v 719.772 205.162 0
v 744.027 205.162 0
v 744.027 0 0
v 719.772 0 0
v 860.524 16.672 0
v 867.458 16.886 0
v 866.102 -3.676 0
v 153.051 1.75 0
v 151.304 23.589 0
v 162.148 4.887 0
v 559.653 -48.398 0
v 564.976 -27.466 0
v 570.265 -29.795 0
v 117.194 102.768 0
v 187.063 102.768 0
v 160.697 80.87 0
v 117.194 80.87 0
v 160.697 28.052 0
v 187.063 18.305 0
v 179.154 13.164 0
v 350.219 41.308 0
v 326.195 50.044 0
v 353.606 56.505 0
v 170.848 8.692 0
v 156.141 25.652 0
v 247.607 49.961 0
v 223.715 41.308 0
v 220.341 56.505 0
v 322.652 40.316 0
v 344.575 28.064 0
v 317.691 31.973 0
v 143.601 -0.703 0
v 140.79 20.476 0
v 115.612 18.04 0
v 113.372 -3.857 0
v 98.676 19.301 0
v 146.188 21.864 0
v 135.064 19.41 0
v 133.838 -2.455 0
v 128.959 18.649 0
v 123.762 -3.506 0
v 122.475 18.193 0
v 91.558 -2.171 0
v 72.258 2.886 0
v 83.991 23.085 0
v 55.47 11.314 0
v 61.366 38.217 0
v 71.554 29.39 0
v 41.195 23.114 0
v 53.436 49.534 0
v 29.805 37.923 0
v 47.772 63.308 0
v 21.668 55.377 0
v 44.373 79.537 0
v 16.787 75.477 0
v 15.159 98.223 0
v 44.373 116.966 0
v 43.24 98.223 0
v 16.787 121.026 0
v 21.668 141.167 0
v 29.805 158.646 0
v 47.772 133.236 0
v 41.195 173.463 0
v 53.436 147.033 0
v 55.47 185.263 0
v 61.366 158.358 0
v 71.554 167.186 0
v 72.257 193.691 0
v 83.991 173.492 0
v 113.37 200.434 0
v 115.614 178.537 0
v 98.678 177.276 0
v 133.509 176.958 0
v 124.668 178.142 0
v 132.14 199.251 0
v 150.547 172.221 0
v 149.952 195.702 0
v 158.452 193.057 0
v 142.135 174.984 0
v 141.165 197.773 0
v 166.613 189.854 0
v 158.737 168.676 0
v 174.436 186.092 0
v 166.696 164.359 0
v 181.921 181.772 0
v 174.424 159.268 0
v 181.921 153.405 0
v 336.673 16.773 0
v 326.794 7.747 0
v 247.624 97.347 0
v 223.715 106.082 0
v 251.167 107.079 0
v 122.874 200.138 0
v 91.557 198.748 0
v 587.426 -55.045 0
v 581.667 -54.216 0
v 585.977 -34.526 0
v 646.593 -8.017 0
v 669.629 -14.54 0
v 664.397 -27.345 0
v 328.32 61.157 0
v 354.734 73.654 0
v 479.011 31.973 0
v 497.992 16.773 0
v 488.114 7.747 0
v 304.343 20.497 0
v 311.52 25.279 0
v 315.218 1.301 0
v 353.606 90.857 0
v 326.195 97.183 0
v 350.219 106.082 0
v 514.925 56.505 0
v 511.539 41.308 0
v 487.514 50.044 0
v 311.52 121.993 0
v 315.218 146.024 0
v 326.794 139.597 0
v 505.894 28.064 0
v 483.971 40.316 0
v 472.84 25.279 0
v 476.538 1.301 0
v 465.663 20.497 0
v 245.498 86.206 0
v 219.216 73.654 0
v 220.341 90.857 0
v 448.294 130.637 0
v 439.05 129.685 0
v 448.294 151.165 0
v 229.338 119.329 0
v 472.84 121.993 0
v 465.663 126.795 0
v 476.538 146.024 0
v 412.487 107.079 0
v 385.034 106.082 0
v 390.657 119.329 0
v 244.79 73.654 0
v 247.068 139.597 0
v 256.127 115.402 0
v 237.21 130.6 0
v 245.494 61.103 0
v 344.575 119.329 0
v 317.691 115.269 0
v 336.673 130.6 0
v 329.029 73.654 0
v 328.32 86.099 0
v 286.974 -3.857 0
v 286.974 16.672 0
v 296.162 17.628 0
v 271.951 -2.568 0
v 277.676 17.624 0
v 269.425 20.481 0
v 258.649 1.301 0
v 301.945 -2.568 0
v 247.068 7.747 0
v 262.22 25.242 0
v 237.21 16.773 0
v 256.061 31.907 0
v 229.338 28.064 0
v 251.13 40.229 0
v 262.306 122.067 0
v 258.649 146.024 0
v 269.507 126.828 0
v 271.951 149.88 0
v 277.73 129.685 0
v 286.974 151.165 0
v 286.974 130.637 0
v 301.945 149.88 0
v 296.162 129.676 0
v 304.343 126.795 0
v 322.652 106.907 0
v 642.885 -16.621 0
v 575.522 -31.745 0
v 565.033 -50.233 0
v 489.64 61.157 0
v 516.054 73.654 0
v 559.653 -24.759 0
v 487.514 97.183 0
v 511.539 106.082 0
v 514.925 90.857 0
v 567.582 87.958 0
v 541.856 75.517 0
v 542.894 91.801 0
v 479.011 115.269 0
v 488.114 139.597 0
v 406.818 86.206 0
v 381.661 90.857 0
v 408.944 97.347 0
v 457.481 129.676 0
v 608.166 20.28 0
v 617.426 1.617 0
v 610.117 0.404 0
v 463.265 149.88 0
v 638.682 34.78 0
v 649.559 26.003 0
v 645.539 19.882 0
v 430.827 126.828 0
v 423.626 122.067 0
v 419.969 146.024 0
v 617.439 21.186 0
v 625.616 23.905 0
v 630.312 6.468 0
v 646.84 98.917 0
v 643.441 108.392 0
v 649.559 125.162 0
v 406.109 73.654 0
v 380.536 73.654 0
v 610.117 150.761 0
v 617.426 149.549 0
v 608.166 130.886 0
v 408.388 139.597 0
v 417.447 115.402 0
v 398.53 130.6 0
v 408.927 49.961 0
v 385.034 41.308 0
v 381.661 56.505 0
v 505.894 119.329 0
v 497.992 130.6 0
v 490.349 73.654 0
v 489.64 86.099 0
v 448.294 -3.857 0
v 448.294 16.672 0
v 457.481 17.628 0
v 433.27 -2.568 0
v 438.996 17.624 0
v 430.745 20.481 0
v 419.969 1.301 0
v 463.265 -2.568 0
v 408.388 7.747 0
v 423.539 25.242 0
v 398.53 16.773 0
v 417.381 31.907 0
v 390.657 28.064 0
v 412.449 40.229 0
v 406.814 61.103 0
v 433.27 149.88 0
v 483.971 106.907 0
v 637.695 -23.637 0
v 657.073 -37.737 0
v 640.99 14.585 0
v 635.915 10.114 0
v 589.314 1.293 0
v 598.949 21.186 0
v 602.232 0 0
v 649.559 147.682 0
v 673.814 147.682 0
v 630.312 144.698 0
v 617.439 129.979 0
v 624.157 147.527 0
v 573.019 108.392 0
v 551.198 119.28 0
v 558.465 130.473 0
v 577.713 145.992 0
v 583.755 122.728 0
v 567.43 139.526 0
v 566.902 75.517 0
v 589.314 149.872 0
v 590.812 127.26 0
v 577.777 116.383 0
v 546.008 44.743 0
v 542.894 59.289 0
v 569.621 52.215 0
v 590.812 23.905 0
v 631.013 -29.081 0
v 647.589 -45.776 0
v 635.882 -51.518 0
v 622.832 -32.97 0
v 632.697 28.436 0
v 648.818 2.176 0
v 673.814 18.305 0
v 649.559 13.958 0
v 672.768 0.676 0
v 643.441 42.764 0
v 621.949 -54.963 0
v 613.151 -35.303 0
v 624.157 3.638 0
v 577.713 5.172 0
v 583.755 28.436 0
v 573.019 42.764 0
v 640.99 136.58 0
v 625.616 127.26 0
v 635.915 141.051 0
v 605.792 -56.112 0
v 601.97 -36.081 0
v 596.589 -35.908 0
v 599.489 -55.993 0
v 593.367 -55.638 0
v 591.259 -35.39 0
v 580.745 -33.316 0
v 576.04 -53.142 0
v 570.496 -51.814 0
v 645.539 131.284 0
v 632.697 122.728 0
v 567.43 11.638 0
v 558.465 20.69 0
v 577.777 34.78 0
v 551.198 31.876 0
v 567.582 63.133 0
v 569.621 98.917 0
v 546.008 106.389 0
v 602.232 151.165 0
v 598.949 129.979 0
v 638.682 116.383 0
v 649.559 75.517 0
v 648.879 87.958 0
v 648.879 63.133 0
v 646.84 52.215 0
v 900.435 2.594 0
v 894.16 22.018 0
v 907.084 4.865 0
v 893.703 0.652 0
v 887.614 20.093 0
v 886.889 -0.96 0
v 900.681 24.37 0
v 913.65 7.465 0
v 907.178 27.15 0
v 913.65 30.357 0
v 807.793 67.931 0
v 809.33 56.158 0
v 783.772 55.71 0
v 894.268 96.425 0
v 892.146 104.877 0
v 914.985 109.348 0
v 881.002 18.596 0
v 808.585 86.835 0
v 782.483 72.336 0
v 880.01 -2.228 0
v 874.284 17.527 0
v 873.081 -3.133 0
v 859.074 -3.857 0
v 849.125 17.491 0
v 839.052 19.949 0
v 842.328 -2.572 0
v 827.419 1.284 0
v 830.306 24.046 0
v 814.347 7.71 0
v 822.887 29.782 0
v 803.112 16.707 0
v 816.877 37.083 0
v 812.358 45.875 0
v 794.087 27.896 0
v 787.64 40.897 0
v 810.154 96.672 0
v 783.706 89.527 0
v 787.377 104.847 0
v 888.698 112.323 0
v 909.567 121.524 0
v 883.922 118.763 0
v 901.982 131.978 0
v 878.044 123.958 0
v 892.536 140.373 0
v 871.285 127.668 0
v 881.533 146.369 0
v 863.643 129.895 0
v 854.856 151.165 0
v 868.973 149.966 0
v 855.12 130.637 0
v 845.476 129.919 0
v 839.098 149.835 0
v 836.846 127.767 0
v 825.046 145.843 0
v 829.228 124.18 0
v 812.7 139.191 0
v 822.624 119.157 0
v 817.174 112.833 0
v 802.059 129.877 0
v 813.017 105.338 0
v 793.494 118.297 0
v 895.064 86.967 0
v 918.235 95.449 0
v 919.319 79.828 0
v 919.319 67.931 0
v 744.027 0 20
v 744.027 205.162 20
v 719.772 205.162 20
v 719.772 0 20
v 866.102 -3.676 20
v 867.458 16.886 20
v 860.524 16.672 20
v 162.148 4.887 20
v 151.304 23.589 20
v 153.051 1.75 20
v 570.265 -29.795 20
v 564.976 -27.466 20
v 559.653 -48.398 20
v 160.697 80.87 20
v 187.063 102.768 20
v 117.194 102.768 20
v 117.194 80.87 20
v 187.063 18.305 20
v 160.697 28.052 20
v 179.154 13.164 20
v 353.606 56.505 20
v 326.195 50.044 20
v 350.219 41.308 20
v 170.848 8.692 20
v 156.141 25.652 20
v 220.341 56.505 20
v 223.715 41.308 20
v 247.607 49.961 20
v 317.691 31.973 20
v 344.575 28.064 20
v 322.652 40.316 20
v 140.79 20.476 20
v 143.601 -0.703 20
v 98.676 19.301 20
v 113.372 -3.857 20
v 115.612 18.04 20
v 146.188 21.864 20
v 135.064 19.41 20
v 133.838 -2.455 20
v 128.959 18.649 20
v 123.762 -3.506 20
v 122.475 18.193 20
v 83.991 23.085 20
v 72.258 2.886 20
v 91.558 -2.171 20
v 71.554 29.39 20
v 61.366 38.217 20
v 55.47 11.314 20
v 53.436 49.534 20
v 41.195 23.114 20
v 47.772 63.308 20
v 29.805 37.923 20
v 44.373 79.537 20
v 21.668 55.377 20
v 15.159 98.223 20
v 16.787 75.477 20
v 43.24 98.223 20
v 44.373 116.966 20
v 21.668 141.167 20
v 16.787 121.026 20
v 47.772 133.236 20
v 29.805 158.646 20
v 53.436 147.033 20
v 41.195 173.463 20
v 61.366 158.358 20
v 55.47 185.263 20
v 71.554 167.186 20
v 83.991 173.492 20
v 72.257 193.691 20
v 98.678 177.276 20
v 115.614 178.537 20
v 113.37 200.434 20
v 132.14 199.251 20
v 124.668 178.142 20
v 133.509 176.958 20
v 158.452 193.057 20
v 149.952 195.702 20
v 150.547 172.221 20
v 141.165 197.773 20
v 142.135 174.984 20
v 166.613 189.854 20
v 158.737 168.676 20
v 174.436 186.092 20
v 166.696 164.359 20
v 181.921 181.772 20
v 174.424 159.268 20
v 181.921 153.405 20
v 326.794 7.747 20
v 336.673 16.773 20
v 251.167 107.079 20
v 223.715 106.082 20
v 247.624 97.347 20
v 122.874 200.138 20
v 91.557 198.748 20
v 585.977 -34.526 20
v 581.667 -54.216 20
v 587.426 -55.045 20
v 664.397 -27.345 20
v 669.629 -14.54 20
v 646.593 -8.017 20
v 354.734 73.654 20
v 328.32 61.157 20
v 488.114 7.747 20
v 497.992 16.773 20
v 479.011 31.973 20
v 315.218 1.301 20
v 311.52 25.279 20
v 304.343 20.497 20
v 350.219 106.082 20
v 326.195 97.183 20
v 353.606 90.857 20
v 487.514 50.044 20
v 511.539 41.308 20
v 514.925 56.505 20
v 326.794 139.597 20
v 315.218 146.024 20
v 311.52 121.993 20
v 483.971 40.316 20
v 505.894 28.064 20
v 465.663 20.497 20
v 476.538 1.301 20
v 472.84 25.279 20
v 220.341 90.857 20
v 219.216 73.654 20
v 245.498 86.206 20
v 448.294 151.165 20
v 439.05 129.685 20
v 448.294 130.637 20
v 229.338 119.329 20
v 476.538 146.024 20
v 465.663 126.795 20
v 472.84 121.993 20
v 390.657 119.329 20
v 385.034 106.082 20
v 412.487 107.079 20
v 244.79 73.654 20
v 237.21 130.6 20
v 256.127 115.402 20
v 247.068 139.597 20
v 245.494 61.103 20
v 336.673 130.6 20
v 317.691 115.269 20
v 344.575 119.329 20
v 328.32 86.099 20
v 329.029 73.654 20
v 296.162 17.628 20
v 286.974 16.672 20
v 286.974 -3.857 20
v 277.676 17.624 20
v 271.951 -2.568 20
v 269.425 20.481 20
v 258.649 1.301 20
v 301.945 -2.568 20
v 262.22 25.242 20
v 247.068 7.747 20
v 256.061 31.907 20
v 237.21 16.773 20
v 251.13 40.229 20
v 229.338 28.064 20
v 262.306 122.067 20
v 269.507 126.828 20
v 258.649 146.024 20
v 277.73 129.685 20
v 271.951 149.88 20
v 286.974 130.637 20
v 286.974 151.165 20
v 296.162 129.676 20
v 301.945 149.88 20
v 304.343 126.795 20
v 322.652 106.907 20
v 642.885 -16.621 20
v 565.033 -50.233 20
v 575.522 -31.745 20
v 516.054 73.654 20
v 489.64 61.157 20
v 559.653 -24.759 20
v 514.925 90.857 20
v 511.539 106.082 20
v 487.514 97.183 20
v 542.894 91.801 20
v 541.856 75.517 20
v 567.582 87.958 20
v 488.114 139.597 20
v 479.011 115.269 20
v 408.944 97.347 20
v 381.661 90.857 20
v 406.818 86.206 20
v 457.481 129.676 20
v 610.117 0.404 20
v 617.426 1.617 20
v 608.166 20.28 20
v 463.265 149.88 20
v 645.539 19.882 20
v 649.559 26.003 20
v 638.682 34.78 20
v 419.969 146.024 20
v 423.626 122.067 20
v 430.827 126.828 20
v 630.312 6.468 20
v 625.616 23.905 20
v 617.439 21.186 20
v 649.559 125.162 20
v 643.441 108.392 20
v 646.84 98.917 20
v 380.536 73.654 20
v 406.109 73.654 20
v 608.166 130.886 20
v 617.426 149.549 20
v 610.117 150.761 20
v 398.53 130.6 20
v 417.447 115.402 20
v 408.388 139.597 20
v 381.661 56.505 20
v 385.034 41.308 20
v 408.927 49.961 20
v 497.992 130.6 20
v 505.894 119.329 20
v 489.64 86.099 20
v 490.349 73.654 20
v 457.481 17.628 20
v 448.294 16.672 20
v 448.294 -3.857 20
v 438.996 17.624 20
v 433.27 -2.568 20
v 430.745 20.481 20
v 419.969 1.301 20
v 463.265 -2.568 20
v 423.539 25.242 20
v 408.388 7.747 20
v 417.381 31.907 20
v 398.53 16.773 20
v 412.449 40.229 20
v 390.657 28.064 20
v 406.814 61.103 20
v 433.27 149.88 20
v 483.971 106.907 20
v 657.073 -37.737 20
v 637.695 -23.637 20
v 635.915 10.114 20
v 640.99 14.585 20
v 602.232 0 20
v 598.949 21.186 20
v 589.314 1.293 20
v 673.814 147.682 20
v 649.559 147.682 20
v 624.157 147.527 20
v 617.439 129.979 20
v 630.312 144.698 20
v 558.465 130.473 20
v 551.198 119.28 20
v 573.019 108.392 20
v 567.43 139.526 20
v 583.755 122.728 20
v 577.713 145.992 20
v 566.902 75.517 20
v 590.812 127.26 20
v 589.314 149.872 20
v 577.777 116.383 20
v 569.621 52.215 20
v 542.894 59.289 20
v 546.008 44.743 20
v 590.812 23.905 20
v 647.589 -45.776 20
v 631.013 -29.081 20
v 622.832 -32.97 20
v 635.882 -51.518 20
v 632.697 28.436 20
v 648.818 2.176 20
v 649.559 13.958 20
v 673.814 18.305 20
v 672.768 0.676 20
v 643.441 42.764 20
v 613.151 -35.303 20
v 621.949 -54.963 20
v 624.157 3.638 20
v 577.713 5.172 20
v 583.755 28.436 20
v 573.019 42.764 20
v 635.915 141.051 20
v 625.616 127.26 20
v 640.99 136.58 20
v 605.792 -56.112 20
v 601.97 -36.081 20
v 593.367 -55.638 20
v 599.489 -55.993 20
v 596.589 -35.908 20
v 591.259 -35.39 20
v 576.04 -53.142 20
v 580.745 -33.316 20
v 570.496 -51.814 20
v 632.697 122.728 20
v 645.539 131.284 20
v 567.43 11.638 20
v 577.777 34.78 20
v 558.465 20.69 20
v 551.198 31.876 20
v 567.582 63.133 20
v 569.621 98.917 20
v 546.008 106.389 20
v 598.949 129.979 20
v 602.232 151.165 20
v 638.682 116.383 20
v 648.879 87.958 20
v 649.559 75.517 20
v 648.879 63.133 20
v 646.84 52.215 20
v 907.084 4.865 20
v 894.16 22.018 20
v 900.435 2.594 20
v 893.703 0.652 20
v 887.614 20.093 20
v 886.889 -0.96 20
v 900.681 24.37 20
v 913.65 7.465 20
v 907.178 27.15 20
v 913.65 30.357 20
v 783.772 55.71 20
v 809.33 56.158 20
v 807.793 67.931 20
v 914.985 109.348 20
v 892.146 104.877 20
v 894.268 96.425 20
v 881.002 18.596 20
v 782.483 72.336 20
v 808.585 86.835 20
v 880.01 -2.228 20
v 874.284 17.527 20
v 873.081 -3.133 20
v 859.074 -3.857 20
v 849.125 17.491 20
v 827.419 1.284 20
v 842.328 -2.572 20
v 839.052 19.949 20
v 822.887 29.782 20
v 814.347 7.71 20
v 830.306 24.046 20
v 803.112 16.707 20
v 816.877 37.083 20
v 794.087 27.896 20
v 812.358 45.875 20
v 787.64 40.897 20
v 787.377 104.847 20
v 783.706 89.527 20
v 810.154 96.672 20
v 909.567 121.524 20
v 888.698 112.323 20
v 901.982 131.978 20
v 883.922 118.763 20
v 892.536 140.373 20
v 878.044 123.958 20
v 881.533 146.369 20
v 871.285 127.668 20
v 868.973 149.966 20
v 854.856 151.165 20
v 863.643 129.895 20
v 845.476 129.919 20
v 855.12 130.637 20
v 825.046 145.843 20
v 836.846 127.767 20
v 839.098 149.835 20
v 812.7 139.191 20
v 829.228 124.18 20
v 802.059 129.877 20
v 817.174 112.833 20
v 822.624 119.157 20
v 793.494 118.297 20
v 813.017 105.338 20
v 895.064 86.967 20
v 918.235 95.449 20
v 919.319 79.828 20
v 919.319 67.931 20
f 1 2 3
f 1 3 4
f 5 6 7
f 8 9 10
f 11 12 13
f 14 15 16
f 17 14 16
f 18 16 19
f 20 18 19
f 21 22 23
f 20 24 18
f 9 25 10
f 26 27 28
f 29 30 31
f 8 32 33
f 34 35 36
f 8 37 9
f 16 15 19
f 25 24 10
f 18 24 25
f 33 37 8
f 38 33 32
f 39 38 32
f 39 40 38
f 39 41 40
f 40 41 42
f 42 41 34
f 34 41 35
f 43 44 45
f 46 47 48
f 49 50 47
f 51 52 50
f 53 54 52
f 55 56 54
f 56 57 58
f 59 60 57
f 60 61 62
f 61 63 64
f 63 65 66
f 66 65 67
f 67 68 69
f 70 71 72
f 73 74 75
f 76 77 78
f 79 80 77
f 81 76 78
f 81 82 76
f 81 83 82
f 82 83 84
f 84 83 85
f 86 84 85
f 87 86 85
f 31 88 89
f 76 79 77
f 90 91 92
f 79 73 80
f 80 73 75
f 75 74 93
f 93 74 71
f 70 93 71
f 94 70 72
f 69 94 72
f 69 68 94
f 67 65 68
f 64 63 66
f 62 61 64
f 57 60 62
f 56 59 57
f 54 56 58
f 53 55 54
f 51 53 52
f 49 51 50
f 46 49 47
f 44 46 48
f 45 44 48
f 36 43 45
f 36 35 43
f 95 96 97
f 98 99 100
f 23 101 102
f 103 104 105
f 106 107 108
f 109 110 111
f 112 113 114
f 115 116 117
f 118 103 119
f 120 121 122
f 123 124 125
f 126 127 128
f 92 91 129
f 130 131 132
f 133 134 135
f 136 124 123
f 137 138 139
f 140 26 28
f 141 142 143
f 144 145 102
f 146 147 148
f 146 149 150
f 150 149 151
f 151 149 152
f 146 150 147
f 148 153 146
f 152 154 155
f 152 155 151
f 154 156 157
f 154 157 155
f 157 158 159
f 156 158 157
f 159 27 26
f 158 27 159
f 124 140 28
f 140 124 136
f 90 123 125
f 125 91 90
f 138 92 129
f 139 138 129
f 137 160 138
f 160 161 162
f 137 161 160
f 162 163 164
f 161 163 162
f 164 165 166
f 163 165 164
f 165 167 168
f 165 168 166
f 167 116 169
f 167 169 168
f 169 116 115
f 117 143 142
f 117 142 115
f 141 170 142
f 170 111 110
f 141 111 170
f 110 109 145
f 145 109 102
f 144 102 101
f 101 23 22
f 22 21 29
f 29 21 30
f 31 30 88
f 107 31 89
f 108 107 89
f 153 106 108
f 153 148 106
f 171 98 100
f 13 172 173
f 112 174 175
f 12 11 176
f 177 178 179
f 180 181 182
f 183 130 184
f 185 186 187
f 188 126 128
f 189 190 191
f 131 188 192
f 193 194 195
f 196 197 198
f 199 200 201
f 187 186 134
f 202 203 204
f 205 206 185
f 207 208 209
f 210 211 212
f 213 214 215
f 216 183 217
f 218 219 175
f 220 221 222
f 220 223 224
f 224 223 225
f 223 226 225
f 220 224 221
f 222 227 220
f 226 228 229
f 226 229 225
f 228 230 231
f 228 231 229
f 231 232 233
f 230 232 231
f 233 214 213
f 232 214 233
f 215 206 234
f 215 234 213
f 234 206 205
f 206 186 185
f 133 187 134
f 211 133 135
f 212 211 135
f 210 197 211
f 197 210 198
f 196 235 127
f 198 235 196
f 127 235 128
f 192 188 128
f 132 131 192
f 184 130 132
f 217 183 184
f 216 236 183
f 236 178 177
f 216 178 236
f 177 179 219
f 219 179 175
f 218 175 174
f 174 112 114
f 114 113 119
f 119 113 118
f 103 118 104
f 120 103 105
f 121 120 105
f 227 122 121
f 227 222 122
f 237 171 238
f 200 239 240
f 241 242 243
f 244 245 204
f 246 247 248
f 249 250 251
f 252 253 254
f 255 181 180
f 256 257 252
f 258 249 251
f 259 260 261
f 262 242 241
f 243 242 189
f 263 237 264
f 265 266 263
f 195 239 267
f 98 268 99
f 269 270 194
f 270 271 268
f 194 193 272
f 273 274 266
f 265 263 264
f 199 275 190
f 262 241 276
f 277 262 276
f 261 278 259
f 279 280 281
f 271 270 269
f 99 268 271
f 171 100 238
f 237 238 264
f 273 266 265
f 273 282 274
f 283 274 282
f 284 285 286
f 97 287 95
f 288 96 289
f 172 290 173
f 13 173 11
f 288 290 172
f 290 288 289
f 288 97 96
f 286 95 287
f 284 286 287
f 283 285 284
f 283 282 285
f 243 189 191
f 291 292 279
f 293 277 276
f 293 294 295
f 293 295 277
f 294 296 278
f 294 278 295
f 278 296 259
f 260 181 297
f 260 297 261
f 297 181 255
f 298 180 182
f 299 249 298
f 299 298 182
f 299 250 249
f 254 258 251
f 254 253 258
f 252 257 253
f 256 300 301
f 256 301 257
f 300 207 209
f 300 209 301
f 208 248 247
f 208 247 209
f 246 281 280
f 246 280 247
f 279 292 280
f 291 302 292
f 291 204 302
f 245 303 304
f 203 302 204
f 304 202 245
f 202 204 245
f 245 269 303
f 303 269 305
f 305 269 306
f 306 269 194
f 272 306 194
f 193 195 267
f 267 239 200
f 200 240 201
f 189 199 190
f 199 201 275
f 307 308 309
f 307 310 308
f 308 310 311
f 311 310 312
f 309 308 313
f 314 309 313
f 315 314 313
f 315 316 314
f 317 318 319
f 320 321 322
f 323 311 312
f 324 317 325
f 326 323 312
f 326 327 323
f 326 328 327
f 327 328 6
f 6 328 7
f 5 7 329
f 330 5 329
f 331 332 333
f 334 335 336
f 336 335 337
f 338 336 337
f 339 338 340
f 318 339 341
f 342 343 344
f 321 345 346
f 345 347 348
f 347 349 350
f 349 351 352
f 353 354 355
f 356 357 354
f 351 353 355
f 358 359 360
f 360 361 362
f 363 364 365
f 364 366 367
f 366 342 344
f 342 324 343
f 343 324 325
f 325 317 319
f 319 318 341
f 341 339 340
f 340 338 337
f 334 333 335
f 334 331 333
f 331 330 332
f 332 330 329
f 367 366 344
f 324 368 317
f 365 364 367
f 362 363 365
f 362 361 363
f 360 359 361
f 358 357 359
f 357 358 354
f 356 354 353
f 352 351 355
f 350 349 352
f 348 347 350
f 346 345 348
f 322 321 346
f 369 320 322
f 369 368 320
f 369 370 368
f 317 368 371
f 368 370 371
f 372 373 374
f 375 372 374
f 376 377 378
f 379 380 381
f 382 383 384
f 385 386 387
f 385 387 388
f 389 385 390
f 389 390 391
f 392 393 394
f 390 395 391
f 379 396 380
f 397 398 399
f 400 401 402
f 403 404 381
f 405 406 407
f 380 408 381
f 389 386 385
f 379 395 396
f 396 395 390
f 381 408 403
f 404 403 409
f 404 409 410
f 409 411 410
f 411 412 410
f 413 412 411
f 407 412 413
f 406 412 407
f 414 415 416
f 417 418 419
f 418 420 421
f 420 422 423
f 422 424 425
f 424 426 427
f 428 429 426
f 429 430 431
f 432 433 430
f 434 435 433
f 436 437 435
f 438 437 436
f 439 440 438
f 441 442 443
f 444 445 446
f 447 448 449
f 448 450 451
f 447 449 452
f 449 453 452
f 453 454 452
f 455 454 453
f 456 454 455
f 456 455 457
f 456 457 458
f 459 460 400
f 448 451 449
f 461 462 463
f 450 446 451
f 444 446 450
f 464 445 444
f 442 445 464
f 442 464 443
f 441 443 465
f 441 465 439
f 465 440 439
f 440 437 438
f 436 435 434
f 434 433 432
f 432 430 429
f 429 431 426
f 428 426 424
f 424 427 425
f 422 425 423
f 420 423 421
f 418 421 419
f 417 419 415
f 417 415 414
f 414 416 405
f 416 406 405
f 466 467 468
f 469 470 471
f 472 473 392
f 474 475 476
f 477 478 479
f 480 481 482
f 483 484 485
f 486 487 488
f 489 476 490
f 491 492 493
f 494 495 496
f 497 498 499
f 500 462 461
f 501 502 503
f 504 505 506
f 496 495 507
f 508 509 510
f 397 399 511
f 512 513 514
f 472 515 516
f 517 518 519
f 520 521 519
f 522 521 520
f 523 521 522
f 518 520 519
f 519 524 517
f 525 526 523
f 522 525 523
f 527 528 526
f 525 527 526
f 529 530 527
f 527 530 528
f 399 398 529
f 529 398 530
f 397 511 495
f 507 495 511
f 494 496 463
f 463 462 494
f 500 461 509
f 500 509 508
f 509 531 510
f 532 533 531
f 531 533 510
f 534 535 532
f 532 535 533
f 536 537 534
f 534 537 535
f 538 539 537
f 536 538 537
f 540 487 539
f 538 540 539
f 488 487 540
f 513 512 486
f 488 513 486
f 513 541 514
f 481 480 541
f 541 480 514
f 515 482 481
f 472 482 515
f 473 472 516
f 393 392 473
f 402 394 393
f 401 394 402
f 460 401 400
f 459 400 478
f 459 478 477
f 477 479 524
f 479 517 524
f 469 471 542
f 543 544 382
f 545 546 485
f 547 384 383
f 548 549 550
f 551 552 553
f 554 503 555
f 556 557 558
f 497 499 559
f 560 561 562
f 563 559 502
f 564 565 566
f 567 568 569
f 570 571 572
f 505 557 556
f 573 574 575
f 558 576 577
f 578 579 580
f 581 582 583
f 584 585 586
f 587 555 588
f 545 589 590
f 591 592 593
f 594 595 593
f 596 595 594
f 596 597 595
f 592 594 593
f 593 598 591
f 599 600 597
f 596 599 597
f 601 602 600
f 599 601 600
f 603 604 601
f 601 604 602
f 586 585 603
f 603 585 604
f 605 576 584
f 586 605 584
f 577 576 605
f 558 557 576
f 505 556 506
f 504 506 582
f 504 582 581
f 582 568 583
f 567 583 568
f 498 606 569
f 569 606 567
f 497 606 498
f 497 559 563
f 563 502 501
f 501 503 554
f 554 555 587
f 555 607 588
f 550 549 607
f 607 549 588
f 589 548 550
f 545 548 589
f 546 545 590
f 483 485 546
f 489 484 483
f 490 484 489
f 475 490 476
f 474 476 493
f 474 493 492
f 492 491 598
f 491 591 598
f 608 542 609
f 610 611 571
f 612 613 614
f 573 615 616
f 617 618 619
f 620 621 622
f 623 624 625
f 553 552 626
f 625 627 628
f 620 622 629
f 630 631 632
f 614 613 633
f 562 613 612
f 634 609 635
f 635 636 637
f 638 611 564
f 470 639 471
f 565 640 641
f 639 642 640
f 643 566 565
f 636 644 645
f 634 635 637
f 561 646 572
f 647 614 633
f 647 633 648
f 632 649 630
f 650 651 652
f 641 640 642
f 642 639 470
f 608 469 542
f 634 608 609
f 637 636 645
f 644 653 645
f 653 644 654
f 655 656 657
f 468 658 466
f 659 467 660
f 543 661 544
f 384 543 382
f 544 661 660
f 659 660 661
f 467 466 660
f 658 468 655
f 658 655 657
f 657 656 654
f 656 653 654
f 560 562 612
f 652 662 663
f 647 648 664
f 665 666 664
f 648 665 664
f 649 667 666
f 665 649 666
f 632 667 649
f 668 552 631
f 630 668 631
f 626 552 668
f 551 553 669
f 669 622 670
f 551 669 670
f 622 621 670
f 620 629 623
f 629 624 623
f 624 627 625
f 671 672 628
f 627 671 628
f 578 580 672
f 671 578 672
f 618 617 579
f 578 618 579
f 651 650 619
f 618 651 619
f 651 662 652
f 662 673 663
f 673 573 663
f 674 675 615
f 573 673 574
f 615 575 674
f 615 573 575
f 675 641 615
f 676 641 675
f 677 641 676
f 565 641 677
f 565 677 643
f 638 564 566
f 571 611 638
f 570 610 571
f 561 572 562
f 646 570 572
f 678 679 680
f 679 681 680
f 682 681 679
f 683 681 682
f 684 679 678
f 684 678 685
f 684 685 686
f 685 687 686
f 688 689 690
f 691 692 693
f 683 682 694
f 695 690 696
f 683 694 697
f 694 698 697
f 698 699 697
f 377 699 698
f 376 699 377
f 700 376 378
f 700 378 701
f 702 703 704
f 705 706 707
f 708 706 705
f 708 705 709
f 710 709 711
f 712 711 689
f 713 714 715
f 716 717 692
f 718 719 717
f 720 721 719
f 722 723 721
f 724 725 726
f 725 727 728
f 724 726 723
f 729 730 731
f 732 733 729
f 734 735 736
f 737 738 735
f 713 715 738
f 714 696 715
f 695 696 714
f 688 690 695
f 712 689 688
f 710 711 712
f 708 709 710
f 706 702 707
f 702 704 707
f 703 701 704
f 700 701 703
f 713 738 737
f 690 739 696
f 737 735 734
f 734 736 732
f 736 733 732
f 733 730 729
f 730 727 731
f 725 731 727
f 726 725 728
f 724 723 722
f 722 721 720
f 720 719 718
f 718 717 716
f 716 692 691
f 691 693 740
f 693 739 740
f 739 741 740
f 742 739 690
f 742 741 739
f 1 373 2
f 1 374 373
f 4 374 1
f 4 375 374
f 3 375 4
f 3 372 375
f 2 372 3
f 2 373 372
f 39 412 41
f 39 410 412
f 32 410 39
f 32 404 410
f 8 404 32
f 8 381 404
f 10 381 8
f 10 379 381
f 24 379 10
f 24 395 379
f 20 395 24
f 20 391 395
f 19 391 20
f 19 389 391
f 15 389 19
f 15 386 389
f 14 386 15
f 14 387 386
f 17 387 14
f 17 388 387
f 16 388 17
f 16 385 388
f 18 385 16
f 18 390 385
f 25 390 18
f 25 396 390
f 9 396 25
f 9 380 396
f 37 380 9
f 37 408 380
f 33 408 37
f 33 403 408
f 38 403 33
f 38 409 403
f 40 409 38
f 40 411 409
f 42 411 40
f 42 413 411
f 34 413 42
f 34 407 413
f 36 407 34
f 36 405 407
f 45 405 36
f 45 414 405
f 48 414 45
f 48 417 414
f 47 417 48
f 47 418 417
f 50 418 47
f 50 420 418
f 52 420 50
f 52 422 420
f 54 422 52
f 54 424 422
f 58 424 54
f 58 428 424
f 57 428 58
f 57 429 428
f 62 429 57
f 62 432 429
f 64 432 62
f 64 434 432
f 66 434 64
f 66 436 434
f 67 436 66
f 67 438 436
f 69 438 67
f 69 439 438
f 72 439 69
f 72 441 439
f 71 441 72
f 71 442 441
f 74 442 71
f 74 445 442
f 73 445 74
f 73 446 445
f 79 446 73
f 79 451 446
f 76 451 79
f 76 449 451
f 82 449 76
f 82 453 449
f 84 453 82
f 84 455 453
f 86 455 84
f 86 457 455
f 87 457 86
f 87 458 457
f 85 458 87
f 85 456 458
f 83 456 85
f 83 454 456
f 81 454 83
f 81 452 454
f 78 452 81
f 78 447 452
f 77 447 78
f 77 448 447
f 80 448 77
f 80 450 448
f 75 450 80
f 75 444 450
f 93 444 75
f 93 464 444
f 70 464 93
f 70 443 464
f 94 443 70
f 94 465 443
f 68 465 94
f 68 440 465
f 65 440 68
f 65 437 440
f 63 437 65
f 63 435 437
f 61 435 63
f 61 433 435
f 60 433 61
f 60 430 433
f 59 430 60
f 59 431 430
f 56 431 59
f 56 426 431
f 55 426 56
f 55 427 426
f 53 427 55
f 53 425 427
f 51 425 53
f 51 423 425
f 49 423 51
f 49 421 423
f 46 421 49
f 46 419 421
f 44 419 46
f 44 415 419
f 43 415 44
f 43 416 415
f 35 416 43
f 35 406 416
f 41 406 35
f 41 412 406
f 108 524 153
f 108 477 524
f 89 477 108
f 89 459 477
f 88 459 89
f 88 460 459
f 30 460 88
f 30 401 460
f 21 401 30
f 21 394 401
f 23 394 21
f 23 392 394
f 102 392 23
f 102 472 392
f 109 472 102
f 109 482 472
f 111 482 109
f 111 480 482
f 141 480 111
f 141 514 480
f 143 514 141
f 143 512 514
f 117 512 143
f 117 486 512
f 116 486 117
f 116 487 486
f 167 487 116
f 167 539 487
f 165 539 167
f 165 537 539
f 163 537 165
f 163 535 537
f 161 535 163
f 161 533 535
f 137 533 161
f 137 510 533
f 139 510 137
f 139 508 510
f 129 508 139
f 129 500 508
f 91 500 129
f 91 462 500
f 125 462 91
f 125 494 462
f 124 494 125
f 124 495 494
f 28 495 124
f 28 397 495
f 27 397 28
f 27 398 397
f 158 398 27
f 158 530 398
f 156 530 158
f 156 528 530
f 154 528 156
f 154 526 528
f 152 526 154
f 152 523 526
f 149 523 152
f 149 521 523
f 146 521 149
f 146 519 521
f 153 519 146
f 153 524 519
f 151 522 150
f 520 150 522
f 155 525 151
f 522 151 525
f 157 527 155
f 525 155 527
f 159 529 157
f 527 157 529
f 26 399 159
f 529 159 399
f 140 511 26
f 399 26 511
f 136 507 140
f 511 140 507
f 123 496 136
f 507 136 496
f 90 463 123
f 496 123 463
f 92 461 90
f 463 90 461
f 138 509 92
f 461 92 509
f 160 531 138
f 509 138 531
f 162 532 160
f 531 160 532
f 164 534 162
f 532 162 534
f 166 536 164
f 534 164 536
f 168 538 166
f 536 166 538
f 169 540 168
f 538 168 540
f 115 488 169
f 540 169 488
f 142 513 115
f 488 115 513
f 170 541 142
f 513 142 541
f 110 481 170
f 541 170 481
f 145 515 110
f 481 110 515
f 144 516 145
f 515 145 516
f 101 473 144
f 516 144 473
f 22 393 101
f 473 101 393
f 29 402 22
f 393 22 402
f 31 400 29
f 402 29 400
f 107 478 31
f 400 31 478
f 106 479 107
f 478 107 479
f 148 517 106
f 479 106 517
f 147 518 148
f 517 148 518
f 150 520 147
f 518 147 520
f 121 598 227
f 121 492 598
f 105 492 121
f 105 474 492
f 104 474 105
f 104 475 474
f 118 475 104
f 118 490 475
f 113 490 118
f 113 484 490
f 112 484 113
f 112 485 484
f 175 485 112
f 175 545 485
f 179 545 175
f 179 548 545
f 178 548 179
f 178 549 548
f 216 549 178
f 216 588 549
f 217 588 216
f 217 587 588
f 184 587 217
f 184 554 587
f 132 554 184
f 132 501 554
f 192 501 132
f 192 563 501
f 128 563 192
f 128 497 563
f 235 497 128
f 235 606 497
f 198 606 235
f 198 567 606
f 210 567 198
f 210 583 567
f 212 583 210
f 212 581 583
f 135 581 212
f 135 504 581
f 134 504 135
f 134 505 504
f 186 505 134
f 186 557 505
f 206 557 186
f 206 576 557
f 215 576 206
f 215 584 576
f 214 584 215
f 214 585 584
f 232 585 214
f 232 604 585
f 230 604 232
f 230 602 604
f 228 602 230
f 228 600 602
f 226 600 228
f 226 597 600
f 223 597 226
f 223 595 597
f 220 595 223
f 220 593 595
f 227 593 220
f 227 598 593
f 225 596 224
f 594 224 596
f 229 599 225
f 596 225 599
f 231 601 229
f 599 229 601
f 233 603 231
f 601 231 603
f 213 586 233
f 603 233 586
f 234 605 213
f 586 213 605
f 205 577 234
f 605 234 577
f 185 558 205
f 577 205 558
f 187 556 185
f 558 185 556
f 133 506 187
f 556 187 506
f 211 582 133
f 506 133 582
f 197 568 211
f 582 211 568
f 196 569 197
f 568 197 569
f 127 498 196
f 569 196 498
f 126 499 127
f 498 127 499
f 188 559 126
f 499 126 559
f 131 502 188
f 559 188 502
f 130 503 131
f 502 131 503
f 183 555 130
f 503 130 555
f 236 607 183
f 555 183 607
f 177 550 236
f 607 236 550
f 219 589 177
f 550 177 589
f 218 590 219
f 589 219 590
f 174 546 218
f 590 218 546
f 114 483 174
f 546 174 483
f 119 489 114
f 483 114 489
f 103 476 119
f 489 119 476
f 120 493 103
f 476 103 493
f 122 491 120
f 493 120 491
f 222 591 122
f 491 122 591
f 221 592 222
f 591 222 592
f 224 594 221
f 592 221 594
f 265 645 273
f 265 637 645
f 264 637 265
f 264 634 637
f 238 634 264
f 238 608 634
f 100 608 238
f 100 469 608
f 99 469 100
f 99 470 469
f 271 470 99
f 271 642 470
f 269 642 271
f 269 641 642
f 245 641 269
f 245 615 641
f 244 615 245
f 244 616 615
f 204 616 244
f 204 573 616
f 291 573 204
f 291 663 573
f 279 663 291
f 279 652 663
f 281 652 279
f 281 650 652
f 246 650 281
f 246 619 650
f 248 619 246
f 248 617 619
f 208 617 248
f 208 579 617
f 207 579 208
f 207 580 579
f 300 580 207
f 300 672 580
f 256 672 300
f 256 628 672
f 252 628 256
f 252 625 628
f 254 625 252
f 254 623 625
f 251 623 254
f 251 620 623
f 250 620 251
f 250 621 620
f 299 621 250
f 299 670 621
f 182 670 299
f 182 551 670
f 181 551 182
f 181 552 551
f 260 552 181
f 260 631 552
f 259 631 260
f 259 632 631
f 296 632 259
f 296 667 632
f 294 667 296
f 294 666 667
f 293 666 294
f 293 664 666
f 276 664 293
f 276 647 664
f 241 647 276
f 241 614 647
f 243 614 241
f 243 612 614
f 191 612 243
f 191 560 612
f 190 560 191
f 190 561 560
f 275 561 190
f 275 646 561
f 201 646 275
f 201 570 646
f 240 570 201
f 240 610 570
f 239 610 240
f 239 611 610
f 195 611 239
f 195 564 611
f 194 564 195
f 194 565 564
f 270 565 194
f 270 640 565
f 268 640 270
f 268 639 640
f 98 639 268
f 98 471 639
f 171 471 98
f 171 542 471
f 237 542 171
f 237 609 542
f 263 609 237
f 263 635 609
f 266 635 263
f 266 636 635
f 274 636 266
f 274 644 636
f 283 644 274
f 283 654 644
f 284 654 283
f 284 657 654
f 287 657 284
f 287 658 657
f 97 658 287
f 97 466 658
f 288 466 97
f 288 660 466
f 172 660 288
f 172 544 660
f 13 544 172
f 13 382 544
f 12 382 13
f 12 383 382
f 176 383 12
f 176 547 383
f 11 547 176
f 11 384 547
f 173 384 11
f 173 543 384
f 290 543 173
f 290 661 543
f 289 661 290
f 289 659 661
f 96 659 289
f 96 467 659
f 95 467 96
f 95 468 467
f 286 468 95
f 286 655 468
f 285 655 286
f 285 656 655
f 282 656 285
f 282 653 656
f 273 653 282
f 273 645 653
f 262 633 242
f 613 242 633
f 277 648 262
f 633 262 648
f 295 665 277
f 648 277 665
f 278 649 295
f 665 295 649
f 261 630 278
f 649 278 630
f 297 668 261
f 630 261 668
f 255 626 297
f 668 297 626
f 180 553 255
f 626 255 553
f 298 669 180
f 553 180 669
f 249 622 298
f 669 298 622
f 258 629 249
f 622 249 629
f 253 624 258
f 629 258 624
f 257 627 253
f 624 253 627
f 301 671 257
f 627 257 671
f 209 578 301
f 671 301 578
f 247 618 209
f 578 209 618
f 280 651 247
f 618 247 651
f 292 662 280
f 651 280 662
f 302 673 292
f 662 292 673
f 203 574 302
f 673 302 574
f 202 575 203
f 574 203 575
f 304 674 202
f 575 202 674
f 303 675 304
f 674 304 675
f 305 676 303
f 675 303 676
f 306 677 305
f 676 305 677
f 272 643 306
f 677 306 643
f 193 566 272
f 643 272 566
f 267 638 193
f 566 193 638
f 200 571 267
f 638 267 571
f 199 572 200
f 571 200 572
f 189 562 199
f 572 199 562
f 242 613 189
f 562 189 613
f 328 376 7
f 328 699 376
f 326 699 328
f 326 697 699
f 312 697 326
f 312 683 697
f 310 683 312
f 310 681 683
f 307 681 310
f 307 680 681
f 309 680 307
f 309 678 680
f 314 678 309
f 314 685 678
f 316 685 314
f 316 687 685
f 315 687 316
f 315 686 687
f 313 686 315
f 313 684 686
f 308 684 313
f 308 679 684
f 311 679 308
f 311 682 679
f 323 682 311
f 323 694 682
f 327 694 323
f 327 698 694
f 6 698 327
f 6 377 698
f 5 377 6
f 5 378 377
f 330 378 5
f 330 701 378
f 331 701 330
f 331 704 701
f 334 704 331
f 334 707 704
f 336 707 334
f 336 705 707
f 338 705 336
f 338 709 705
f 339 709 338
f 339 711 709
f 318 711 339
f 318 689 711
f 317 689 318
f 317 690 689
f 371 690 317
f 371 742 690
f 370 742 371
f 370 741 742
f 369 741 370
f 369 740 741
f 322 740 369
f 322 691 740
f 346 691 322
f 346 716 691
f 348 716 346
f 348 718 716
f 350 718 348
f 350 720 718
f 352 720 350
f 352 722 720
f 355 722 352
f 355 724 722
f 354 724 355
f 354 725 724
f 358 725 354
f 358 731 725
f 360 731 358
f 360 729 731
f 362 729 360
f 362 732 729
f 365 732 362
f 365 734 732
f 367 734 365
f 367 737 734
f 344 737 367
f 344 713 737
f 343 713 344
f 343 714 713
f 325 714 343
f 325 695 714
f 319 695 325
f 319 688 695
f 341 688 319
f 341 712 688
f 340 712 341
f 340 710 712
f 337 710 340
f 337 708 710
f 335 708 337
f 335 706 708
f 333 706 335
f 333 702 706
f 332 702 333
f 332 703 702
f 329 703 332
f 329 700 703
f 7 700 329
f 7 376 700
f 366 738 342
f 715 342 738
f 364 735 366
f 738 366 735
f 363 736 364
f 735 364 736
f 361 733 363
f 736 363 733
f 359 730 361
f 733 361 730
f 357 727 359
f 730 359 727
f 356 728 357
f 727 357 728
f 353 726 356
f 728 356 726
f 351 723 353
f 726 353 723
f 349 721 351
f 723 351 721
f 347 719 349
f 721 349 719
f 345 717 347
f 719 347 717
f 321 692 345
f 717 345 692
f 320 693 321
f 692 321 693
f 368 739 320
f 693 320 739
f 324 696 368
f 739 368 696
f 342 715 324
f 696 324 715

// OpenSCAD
letter = "Google";
linear_extrude(20) text(letter,  72*2.7, "Product Sans:style=Regular");
